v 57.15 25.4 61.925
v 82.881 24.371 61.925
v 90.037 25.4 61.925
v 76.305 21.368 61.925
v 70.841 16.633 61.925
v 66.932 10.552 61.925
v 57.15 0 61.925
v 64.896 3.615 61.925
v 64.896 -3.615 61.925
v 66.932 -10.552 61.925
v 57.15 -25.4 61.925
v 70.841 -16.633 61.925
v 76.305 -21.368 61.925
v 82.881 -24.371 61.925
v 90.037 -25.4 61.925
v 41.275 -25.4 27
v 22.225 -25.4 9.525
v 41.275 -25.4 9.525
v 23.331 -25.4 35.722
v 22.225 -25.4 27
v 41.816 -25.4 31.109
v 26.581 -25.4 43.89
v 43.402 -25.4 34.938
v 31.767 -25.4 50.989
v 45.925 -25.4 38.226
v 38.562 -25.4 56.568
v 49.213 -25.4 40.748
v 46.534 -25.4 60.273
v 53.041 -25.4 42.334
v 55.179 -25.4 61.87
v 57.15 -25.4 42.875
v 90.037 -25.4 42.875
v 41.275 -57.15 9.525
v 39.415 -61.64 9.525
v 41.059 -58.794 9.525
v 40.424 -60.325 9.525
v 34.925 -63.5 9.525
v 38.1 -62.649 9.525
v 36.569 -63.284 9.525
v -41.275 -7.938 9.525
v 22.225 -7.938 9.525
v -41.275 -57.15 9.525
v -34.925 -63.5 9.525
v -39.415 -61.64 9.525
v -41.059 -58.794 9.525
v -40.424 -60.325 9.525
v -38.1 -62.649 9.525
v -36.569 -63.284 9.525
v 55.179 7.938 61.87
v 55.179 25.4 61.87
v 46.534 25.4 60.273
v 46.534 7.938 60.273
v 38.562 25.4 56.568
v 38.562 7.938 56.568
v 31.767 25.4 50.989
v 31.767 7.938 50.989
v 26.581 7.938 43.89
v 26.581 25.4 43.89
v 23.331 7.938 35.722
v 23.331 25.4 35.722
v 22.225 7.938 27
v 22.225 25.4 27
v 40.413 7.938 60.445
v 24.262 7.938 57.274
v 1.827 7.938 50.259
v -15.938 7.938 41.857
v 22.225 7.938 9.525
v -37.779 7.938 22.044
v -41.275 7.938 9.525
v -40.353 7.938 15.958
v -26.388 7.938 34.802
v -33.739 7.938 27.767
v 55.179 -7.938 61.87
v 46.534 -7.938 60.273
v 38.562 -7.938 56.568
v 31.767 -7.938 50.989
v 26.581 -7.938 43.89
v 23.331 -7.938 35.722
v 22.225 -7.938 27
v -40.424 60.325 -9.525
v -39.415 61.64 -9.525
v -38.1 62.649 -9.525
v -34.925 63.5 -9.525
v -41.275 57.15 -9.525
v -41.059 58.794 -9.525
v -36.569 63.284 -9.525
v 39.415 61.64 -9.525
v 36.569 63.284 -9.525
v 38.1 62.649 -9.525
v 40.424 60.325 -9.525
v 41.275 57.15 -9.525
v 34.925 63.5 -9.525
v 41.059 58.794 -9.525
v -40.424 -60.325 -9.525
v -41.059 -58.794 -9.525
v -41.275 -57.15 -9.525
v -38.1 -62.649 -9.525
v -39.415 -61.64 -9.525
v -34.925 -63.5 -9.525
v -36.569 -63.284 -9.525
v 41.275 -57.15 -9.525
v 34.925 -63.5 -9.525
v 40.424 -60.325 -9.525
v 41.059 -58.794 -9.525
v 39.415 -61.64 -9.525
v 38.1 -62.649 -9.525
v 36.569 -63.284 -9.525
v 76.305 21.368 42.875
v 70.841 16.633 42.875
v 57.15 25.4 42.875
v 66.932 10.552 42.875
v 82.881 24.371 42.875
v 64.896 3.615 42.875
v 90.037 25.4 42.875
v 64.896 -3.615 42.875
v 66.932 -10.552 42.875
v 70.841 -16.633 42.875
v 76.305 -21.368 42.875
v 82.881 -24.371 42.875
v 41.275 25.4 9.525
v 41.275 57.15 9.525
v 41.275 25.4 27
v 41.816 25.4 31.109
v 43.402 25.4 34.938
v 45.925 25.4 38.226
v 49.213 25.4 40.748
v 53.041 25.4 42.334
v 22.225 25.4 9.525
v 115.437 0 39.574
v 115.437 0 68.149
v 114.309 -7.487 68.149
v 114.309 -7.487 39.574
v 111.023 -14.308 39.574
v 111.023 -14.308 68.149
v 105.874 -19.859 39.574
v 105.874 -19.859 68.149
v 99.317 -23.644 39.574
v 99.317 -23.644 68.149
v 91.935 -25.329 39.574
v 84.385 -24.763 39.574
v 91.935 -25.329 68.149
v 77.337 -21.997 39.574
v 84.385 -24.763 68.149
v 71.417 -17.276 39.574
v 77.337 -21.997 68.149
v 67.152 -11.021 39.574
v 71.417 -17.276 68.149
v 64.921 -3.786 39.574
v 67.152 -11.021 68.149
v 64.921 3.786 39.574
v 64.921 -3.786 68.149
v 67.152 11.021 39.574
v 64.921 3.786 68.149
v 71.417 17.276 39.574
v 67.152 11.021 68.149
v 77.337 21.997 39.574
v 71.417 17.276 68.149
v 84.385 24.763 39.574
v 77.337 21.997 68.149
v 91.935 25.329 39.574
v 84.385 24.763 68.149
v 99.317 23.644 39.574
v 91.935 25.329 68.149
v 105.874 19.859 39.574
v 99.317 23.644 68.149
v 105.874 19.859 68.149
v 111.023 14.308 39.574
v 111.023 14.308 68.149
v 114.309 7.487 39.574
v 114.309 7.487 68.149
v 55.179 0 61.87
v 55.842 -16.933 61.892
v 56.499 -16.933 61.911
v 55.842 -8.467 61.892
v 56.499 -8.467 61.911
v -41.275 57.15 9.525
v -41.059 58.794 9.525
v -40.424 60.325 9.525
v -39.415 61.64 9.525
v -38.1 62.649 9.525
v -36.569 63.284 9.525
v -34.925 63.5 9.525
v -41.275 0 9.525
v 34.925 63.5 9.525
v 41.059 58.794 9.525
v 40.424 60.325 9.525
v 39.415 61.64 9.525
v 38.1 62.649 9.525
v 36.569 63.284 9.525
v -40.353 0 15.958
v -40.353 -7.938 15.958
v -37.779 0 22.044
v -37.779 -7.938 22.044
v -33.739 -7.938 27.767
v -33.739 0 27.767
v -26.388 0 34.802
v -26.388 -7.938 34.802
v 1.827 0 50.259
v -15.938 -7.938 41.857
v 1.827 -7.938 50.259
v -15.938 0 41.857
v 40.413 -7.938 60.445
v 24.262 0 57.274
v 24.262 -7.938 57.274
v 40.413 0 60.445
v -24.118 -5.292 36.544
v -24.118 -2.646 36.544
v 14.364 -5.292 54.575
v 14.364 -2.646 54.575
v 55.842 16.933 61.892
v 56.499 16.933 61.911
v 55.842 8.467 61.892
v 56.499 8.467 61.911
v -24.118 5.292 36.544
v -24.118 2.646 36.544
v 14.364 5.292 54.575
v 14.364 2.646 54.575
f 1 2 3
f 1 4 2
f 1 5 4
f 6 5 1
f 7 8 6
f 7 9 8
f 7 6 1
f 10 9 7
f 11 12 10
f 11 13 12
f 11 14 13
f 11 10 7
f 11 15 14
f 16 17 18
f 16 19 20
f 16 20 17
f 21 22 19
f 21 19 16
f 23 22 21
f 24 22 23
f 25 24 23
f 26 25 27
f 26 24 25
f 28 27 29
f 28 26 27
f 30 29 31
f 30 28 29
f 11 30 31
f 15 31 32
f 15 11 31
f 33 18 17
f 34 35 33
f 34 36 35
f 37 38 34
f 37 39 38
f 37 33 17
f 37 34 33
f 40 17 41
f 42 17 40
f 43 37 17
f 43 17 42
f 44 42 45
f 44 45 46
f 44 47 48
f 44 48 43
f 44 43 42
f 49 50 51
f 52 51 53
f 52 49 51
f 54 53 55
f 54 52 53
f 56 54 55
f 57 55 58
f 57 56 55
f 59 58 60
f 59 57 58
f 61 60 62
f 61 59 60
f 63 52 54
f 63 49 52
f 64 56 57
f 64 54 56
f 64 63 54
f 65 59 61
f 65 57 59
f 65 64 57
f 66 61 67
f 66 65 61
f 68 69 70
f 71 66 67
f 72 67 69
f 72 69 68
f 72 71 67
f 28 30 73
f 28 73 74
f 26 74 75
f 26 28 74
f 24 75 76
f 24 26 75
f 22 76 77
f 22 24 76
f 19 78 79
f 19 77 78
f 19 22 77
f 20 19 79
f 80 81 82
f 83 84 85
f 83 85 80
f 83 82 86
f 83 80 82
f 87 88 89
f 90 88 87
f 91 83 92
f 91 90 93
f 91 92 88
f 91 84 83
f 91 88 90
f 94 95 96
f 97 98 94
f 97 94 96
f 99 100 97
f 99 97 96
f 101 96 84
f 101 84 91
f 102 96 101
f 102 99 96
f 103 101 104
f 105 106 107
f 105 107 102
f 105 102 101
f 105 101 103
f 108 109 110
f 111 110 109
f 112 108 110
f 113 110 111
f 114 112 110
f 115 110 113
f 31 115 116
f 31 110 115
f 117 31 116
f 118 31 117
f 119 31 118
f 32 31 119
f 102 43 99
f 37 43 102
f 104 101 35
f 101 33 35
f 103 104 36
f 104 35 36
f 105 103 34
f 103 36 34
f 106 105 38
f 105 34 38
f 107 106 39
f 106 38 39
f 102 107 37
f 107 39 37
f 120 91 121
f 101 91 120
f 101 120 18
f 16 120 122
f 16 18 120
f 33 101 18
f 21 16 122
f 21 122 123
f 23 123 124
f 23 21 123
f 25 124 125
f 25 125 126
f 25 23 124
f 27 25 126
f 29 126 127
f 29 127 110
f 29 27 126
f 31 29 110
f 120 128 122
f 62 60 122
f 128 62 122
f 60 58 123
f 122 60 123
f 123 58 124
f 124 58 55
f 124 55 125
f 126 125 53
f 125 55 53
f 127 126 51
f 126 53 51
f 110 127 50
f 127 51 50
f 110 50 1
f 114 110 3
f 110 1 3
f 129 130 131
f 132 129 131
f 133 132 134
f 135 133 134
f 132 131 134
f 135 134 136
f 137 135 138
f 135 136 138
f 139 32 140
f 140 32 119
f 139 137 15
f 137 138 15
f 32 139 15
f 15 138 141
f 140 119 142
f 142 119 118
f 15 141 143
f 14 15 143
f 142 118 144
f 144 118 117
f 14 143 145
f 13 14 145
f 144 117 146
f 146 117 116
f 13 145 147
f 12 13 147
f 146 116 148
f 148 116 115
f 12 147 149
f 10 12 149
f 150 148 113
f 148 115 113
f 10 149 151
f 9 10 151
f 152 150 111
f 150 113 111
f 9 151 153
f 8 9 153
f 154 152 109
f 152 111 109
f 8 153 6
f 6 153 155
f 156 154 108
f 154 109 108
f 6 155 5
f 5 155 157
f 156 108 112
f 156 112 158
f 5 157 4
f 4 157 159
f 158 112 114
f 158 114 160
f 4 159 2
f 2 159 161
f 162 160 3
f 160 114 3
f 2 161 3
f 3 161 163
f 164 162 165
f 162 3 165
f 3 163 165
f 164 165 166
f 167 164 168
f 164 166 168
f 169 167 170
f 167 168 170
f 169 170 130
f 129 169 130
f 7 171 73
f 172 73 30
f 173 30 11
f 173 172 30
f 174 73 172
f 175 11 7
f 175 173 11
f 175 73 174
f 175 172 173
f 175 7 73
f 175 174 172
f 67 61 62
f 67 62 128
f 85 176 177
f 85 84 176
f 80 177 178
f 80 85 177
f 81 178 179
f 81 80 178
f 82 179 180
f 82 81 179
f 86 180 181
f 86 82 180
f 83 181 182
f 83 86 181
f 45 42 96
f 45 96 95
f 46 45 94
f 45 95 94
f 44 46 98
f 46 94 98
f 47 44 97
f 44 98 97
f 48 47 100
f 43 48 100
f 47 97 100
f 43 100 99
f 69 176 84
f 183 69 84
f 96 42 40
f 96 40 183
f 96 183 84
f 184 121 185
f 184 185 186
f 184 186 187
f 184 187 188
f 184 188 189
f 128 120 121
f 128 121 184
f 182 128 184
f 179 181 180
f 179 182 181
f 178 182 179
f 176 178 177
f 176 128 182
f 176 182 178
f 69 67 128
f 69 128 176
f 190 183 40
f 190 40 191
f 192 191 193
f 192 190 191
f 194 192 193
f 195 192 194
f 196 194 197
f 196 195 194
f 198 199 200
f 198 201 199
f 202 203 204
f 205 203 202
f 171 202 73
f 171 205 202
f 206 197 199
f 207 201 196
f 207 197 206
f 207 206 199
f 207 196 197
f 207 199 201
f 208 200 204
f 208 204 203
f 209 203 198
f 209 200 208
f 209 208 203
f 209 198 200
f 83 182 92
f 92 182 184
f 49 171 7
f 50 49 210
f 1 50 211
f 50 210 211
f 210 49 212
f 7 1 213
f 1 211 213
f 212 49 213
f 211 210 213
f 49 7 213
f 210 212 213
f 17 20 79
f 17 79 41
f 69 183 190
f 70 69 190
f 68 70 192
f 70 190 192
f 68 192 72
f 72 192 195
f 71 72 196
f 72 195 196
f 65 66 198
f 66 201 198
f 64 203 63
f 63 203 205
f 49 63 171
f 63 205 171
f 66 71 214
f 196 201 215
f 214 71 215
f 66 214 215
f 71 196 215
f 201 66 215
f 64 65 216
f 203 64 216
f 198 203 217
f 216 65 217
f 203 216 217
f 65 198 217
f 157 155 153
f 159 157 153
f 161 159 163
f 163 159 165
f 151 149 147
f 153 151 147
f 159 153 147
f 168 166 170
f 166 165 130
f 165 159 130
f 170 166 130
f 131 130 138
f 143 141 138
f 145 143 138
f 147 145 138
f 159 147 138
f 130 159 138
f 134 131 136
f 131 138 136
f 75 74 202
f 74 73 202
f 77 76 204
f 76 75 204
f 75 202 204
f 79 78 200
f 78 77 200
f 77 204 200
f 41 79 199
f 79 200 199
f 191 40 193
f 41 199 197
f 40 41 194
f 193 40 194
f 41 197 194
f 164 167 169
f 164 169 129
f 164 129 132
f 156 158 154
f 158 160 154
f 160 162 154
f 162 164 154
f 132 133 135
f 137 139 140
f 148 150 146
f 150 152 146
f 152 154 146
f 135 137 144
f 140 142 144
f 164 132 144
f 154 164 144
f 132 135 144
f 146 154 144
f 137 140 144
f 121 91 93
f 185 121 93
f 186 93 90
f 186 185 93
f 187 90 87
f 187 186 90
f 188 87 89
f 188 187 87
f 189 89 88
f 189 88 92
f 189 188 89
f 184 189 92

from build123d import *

# Parameters (mm, degrees)
F1_DEPTH = 63.5
F2_DEPTH = 7.9375
F3_DEPTH = 25.4
F5_R     = 6.35


# Not quite as in the source:
# - a feature names something its author has since deleted; it is built from what else it names


with BuildPart() as f1:
    # F0 (on Front) → F1 (new body, symmetric)
    with BuildSketch(Plane.XZ):
        Polygon((-41.275, 9.525), (-41.275, -9.525), (41.275, -9.525), (41.275, 9.525), (22.225, 9.525), align=None)
    extrude(amount=F1_DEPTH, both=True)

    # F0 (on Front) → F2 (join, symmetric)
    with BuildSketch(Plane.XZ):
        with BuildLine():
            add(Edge.make_bspline(
                [(-41.275, 9.525), (-41.112587778, 40.4556006324), (19.5290392467, 60.5257095831), (55.1792354288, 61.8695520445)],
                knots=[0, 0, 0, 0, 109.4601917253, 109.4601917253, 109.4601917253, 109.4601917253], degree=3))
            Line((-41.275, 9.525), (22.225, 9.525))
            Line((22.225, 9.525), (22.225, 27.0002))
            ThreePointArc((22.225, 27.0002), (31.7670866758, 50.9890168982), (55.1792354288, 61.8695520445))
        make_face()
    extrude(amount=F2_DEPTH, both=True)

    # F0 (on Front) → F3 (join, symmetric)
    with BuildSketch(Plane.XZ):
        with BuildLine():
            Line((22.225, 9.525), (41.275, 9.525))
            Line((41.275, 9.525), (41.275, 27.0002))
            ThreePointArc((41.275, 27.0002), (45.9246798487, 38.2255201513), (57.15, 42.8752))
            Line((57.15, 42.8752), (90.0369858318, 42.8752))
            Line((90.0369858318, 42.8752), (90.0369858318, 61.9252))
            Line((90.0369858318, 61.9252), (57.15, 61.9252))
            add(Edge.make_bspline(
                [(55.1792354288, 61.8695520445), (55.8450599549, 61.8946504554), (56.5021670835, 61.9132168549), (57.15, 61.9252)],
                knots=[109.4601917253, 109.4601917253, 109.4601917253, 109.4601917253, 111.5045361635, 111.5045361635, 111.5045361635, 111.5045361635], degree=3))
            ThreePointArc((55.1792354288, 61.8695520445), (31.7670866758, 50.9890168982), (22.225, 27.0002))
            Line((22.225, 27.0002), (22.225, 9.525))
        make_face()
    extrude(amount=F3_DEPTH, both=True)

    # F0 (on Front) → F4 (revolve)
    with BuildSketch(Plane.XZ):
        Polygon((90.0369858318, 68.1490233362), (90.0369858318, 61.9252), (90.0369858318, 42.8752), (90.0369858318, 39.5740233362), (115.4369858318, 39.5740233362), (115.4369858318, 68.1490233362), align=None)
    revolve(axis=Axis((90.0369858318, 0, 53.8615233362), (0, 0, -1)))

    # F5
    f5_edges = [f1.edges().sort_by_distance(p)[0] for p in [
        (-41.275, -63.5, 0),
        (41.275, -63.5, 0),
        (41.275, 63.5, 0),
        (-41.275, 63.5, 0),
    ]]
    fillet(f5_edges, radius=F5_R)


solid = f1.part
